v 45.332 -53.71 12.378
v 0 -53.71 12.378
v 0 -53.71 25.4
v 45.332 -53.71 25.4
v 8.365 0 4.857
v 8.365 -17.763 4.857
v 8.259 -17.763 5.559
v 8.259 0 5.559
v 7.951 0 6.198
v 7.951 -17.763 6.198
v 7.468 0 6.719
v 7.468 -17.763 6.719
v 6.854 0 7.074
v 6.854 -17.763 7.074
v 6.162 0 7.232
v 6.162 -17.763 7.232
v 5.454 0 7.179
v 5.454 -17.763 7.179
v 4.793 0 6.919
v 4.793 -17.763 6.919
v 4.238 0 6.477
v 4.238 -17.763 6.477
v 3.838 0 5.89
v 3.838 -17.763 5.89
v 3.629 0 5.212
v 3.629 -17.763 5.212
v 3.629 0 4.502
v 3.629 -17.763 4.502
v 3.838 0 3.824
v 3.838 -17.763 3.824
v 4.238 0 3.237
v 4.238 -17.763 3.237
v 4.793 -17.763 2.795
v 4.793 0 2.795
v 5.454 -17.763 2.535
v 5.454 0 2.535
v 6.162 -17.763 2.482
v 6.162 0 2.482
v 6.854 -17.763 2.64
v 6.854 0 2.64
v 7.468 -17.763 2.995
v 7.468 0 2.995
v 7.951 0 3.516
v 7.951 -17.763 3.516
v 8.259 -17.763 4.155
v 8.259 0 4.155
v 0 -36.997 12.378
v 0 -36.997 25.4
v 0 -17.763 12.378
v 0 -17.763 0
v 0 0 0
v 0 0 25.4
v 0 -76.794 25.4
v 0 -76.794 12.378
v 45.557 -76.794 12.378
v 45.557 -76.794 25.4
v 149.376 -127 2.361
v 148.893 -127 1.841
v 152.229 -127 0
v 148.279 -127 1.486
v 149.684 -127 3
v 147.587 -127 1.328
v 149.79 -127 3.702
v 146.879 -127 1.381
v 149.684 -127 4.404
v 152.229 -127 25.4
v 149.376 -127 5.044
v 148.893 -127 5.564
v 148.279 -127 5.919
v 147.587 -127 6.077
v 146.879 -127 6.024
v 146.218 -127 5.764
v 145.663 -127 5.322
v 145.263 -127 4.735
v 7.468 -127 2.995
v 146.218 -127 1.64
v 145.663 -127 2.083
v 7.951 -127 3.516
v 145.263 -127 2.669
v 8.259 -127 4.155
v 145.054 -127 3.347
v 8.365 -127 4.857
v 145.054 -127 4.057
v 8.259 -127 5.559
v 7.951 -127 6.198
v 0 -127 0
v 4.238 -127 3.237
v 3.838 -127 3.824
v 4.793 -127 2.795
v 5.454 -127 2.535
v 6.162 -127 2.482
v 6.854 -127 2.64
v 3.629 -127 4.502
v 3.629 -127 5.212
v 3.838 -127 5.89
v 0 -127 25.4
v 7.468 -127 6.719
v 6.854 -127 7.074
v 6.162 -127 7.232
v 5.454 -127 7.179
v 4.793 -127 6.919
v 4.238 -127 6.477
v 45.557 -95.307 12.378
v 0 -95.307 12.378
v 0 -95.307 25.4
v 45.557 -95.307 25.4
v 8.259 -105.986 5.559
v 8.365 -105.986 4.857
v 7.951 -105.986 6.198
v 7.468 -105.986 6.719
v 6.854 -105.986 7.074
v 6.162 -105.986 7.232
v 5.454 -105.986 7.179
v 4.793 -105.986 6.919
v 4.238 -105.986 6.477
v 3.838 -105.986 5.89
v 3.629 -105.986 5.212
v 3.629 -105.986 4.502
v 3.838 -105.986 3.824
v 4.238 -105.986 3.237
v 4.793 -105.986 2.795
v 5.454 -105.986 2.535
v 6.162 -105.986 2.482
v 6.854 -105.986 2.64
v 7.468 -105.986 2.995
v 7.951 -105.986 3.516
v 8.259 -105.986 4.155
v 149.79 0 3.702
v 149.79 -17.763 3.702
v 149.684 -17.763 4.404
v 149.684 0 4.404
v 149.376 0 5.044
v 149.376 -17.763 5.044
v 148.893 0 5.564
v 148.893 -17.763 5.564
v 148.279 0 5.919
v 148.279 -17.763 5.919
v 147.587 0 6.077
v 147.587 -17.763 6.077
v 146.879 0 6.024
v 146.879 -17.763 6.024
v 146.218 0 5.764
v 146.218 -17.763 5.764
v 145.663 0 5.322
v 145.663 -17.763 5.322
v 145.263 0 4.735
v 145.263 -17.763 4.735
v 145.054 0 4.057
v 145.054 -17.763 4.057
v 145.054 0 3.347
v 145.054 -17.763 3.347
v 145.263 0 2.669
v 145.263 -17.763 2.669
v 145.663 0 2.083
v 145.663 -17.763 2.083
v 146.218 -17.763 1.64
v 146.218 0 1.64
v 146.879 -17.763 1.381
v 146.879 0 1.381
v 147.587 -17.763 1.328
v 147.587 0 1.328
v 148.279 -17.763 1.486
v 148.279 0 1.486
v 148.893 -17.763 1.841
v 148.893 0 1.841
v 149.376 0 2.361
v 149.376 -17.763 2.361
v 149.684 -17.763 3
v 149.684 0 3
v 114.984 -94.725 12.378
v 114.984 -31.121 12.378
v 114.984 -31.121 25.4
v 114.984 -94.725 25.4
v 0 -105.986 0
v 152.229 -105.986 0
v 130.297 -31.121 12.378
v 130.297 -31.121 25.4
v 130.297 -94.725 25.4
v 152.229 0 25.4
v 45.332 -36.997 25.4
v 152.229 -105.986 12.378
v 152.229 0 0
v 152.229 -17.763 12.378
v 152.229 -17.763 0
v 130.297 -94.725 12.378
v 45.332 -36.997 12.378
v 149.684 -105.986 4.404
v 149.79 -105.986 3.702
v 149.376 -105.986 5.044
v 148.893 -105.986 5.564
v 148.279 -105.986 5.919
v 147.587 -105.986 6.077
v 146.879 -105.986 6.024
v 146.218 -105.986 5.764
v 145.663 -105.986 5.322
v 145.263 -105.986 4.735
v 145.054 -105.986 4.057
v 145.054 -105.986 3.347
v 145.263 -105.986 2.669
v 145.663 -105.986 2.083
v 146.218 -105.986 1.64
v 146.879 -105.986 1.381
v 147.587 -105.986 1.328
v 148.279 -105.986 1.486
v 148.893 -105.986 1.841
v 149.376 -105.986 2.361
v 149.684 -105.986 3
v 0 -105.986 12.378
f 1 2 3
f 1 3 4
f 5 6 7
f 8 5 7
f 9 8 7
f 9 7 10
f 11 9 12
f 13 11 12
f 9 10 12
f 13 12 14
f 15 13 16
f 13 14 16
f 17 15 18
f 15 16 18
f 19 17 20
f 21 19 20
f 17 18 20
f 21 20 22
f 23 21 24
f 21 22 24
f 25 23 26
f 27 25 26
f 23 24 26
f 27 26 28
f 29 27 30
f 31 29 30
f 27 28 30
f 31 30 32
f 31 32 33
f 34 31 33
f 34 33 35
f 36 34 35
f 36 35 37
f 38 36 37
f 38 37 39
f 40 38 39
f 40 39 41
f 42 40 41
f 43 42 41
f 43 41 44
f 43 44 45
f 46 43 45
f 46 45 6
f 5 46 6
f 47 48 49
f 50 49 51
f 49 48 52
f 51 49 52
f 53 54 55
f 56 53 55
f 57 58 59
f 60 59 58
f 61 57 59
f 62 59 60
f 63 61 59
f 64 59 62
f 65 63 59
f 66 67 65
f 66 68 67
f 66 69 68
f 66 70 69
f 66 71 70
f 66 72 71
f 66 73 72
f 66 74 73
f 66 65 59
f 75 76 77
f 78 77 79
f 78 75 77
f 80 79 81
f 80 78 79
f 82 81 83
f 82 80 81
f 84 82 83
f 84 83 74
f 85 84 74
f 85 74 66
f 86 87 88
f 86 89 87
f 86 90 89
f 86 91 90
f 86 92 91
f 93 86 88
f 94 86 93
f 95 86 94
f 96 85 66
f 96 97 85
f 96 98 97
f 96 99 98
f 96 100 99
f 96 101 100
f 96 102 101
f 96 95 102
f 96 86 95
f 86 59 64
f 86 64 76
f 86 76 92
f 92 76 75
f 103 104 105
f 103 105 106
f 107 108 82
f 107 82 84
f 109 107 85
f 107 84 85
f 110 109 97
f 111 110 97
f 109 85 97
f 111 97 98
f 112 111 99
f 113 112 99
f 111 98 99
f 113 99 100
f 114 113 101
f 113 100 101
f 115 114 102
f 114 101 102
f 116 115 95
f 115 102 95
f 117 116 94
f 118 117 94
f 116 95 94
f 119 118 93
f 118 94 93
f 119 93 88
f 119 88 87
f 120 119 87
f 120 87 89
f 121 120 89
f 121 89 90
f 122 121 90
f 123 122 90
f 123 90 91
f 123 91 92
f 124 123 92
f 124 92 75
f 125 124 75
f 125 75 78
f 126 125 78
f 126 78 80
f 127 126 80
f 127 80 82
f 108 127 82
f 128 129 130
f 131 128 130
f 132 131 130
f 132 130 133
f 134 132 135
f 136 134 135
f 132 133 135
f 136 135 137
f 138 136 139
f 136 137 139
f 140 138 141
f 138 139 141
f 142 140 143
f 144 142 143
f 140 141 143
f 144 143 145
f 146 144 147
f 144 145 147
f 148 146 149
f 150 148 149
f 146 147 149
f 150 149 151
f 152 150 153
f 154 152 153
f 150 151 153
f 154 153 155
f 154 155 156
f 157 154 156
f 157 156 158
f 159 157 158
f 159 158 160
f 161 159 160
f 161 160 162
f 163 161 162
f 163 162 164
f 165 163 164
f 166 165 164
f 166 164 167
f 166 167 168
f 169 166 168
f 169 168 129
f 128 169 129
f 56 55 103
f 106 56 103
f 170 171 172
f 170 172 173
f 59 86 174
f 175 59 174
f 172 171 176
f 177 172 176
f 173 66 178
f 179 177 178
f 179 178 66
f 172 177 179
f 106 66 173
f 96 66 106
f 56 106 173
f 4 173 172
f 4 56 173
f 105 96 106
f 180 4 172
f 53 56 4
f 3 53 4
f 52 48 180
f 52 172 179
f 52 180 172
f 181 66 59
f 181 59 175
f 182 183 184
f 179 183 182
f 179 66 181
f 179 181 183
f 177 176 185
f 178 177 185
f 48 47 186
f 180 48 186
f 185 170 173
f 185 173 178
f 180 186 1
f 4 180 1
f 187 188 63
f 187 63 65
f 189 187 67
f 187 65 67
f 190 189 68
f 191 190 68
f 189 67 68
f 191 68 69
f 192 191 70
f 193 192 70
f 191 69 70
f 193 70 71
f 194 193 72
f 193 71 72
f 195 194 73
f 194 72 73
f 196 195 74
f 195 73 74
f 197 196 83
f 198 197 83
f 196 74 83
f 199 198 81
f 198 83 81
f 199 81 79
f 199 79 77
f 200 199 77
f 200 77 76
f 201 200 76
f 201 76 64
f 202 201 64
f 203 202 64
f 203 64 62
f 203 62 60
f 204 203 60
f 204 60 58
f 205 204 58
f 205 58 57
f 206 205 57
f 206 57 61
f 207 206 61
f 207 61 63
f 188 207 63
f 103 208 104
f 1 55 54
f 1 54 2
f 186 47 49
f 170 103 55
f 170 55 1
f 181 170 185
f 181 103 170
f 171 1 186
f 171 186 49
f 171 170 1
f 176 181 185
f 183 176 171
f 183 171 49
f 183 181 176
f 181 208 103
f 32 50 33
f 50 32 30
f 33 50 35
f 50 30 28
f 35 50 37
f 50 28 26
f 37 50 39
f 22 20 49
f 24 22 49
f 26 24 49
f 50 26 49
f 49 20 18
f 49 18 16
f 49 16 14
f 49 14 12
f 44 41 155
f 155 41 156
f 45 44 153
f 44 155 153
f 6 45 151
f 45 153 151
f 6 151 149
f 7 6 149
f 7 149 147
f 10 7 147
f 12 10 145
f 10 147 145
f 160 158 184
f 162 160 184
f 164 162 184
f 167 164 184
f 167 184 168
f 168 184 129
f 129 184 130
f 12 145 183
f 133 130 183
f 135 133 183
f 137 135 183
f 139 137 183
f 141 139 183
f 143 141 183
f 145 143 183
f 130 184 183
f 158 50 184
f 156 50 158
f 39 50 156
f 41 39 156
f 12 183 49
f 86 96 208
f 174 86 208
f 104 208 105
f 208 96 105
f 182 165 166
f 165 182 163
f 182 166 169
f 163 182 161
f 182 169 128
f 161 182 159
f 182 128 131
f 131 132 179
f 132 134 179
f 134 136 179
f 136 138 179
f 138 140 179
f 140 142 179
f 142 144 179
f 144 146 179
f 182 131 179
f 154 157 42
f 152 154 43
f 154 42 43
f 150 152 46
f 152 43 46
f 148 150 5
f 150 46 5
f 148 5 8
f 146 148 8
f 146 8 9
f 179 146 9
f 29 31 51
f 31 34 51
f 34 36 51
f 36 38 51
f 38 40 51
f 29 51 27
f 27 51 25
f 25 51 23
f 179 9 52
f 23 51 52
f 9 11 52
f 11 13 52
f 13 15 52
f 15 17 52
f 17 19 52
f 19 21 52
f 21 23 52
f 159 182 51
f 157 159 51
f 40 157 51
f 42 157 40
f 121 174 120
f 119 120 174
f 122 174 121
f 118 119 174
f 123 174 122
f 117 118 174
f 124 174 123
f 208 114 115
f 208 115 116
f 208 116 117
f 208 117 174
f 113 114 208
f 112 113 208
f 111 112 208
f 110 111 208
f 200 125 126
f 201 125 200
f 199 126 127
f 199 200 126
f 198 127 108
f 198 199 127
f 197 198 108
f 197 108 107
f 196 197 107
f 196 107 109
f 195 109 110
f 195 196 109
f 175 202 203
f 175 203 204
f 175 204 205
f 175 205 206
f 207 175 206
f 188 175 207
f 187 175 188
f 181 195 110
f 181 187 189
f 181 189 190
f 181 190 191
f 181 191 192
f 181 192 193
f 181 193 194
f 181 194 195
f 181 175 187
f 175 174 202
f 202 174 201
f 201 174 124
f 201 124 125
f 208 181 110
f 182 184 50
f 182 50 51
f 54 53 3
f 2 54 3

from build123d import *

# Parameters (mm, degrees)
F0_W      = 127
F0_H      = 25.4
F1_DEPTH  = 25.4
F2_DEPTH  = 126.8292367458
F3_W      = 88.223606348
F3_H      = 12.3776346445
F4_DEPTH  = 152.2302367458
F5_R      = 2.38125
F6_DEPTH  = 127.001
F7_R      = 2.38125
F8_DEPTH  = 127.001
F9_W      = 45.556999743
F9_H      = 18.5132399201
F9_W_2    = 45.3319624066
F9_H_2    = 16.7129561305
F9_W_3    = 15.3134018183
F9_H_3    = 63.6049769819
F10_DEPTH = 13.0233653555


with BuildPart() as f1:
    # F0 (on Right) → F1 (new body)
    with BuildSketch(Plane.YZ):
        with Locations((-63.5, 12.7)):
            Rectangle(F0_W, F0_H)
    extrude(amount=F1_DEPTH)

    # F2 (add): a face of the model
    f2_faces = [f1.faces().sort_by_distance(p)[0] for p in [
        (25.4, -63.5, 12.7),
    ]]
    extrude(f2_faces, amount=F2_DEPTH)

    # F3 (on face) → F4 (cut, through all)
    with BuildSketch(Plane.YZ.offset(152.2292367458)):
        with Locations((-61.8745535612, 6.1888173223)):
            Rectangle(F3_W, F3_H)
    extrude(amount=-F4_DEPTH, mode=Mode.SUBTRACT)

    # F5 (on face) → F6 (cut, through all)
    with BuildSketch(Plane.XZ.offset(127)):
        with Locations((147.4088132381, 3.7022531033)):
            Circle(F5_R)
    extrude(amount=-F6_DEPTH, mode=Mode.SUBTRACT)

    # F7 (on face) → F8 (cut, through all)
    with BuildSketch(Plane.XZ.offset(127)):
        with Locations((5.9837484732, 4.8569738865)):
            Circle(F7_R)
    extrude(amount=-F8_DEPTH, mode=Mode.SUBTRACT)

    # F9 (on face) → F10 (cut, through all)
    with BuildSketch(Plane(origin=(0, 0, 12.3776346445), x_dir=(1, 0, 0), z_dir=(0, 0, -1))):
        with Locations((22.7784998715, 86.0507525504)):
            Rectangle(F9_W, F9_H)
        with Locations((22.6659812033, 45.3535504639)):
            Rectangle(F9_W_2, F9_H_2)
        with Locations((122.6406171918, 62.9230011255)):
            Rectangle(F9_W_3, F9_H_3)
    extrude(amount=-F10_DEPTH, mode=Mode.SUBTRACT)


solid = f1.part
